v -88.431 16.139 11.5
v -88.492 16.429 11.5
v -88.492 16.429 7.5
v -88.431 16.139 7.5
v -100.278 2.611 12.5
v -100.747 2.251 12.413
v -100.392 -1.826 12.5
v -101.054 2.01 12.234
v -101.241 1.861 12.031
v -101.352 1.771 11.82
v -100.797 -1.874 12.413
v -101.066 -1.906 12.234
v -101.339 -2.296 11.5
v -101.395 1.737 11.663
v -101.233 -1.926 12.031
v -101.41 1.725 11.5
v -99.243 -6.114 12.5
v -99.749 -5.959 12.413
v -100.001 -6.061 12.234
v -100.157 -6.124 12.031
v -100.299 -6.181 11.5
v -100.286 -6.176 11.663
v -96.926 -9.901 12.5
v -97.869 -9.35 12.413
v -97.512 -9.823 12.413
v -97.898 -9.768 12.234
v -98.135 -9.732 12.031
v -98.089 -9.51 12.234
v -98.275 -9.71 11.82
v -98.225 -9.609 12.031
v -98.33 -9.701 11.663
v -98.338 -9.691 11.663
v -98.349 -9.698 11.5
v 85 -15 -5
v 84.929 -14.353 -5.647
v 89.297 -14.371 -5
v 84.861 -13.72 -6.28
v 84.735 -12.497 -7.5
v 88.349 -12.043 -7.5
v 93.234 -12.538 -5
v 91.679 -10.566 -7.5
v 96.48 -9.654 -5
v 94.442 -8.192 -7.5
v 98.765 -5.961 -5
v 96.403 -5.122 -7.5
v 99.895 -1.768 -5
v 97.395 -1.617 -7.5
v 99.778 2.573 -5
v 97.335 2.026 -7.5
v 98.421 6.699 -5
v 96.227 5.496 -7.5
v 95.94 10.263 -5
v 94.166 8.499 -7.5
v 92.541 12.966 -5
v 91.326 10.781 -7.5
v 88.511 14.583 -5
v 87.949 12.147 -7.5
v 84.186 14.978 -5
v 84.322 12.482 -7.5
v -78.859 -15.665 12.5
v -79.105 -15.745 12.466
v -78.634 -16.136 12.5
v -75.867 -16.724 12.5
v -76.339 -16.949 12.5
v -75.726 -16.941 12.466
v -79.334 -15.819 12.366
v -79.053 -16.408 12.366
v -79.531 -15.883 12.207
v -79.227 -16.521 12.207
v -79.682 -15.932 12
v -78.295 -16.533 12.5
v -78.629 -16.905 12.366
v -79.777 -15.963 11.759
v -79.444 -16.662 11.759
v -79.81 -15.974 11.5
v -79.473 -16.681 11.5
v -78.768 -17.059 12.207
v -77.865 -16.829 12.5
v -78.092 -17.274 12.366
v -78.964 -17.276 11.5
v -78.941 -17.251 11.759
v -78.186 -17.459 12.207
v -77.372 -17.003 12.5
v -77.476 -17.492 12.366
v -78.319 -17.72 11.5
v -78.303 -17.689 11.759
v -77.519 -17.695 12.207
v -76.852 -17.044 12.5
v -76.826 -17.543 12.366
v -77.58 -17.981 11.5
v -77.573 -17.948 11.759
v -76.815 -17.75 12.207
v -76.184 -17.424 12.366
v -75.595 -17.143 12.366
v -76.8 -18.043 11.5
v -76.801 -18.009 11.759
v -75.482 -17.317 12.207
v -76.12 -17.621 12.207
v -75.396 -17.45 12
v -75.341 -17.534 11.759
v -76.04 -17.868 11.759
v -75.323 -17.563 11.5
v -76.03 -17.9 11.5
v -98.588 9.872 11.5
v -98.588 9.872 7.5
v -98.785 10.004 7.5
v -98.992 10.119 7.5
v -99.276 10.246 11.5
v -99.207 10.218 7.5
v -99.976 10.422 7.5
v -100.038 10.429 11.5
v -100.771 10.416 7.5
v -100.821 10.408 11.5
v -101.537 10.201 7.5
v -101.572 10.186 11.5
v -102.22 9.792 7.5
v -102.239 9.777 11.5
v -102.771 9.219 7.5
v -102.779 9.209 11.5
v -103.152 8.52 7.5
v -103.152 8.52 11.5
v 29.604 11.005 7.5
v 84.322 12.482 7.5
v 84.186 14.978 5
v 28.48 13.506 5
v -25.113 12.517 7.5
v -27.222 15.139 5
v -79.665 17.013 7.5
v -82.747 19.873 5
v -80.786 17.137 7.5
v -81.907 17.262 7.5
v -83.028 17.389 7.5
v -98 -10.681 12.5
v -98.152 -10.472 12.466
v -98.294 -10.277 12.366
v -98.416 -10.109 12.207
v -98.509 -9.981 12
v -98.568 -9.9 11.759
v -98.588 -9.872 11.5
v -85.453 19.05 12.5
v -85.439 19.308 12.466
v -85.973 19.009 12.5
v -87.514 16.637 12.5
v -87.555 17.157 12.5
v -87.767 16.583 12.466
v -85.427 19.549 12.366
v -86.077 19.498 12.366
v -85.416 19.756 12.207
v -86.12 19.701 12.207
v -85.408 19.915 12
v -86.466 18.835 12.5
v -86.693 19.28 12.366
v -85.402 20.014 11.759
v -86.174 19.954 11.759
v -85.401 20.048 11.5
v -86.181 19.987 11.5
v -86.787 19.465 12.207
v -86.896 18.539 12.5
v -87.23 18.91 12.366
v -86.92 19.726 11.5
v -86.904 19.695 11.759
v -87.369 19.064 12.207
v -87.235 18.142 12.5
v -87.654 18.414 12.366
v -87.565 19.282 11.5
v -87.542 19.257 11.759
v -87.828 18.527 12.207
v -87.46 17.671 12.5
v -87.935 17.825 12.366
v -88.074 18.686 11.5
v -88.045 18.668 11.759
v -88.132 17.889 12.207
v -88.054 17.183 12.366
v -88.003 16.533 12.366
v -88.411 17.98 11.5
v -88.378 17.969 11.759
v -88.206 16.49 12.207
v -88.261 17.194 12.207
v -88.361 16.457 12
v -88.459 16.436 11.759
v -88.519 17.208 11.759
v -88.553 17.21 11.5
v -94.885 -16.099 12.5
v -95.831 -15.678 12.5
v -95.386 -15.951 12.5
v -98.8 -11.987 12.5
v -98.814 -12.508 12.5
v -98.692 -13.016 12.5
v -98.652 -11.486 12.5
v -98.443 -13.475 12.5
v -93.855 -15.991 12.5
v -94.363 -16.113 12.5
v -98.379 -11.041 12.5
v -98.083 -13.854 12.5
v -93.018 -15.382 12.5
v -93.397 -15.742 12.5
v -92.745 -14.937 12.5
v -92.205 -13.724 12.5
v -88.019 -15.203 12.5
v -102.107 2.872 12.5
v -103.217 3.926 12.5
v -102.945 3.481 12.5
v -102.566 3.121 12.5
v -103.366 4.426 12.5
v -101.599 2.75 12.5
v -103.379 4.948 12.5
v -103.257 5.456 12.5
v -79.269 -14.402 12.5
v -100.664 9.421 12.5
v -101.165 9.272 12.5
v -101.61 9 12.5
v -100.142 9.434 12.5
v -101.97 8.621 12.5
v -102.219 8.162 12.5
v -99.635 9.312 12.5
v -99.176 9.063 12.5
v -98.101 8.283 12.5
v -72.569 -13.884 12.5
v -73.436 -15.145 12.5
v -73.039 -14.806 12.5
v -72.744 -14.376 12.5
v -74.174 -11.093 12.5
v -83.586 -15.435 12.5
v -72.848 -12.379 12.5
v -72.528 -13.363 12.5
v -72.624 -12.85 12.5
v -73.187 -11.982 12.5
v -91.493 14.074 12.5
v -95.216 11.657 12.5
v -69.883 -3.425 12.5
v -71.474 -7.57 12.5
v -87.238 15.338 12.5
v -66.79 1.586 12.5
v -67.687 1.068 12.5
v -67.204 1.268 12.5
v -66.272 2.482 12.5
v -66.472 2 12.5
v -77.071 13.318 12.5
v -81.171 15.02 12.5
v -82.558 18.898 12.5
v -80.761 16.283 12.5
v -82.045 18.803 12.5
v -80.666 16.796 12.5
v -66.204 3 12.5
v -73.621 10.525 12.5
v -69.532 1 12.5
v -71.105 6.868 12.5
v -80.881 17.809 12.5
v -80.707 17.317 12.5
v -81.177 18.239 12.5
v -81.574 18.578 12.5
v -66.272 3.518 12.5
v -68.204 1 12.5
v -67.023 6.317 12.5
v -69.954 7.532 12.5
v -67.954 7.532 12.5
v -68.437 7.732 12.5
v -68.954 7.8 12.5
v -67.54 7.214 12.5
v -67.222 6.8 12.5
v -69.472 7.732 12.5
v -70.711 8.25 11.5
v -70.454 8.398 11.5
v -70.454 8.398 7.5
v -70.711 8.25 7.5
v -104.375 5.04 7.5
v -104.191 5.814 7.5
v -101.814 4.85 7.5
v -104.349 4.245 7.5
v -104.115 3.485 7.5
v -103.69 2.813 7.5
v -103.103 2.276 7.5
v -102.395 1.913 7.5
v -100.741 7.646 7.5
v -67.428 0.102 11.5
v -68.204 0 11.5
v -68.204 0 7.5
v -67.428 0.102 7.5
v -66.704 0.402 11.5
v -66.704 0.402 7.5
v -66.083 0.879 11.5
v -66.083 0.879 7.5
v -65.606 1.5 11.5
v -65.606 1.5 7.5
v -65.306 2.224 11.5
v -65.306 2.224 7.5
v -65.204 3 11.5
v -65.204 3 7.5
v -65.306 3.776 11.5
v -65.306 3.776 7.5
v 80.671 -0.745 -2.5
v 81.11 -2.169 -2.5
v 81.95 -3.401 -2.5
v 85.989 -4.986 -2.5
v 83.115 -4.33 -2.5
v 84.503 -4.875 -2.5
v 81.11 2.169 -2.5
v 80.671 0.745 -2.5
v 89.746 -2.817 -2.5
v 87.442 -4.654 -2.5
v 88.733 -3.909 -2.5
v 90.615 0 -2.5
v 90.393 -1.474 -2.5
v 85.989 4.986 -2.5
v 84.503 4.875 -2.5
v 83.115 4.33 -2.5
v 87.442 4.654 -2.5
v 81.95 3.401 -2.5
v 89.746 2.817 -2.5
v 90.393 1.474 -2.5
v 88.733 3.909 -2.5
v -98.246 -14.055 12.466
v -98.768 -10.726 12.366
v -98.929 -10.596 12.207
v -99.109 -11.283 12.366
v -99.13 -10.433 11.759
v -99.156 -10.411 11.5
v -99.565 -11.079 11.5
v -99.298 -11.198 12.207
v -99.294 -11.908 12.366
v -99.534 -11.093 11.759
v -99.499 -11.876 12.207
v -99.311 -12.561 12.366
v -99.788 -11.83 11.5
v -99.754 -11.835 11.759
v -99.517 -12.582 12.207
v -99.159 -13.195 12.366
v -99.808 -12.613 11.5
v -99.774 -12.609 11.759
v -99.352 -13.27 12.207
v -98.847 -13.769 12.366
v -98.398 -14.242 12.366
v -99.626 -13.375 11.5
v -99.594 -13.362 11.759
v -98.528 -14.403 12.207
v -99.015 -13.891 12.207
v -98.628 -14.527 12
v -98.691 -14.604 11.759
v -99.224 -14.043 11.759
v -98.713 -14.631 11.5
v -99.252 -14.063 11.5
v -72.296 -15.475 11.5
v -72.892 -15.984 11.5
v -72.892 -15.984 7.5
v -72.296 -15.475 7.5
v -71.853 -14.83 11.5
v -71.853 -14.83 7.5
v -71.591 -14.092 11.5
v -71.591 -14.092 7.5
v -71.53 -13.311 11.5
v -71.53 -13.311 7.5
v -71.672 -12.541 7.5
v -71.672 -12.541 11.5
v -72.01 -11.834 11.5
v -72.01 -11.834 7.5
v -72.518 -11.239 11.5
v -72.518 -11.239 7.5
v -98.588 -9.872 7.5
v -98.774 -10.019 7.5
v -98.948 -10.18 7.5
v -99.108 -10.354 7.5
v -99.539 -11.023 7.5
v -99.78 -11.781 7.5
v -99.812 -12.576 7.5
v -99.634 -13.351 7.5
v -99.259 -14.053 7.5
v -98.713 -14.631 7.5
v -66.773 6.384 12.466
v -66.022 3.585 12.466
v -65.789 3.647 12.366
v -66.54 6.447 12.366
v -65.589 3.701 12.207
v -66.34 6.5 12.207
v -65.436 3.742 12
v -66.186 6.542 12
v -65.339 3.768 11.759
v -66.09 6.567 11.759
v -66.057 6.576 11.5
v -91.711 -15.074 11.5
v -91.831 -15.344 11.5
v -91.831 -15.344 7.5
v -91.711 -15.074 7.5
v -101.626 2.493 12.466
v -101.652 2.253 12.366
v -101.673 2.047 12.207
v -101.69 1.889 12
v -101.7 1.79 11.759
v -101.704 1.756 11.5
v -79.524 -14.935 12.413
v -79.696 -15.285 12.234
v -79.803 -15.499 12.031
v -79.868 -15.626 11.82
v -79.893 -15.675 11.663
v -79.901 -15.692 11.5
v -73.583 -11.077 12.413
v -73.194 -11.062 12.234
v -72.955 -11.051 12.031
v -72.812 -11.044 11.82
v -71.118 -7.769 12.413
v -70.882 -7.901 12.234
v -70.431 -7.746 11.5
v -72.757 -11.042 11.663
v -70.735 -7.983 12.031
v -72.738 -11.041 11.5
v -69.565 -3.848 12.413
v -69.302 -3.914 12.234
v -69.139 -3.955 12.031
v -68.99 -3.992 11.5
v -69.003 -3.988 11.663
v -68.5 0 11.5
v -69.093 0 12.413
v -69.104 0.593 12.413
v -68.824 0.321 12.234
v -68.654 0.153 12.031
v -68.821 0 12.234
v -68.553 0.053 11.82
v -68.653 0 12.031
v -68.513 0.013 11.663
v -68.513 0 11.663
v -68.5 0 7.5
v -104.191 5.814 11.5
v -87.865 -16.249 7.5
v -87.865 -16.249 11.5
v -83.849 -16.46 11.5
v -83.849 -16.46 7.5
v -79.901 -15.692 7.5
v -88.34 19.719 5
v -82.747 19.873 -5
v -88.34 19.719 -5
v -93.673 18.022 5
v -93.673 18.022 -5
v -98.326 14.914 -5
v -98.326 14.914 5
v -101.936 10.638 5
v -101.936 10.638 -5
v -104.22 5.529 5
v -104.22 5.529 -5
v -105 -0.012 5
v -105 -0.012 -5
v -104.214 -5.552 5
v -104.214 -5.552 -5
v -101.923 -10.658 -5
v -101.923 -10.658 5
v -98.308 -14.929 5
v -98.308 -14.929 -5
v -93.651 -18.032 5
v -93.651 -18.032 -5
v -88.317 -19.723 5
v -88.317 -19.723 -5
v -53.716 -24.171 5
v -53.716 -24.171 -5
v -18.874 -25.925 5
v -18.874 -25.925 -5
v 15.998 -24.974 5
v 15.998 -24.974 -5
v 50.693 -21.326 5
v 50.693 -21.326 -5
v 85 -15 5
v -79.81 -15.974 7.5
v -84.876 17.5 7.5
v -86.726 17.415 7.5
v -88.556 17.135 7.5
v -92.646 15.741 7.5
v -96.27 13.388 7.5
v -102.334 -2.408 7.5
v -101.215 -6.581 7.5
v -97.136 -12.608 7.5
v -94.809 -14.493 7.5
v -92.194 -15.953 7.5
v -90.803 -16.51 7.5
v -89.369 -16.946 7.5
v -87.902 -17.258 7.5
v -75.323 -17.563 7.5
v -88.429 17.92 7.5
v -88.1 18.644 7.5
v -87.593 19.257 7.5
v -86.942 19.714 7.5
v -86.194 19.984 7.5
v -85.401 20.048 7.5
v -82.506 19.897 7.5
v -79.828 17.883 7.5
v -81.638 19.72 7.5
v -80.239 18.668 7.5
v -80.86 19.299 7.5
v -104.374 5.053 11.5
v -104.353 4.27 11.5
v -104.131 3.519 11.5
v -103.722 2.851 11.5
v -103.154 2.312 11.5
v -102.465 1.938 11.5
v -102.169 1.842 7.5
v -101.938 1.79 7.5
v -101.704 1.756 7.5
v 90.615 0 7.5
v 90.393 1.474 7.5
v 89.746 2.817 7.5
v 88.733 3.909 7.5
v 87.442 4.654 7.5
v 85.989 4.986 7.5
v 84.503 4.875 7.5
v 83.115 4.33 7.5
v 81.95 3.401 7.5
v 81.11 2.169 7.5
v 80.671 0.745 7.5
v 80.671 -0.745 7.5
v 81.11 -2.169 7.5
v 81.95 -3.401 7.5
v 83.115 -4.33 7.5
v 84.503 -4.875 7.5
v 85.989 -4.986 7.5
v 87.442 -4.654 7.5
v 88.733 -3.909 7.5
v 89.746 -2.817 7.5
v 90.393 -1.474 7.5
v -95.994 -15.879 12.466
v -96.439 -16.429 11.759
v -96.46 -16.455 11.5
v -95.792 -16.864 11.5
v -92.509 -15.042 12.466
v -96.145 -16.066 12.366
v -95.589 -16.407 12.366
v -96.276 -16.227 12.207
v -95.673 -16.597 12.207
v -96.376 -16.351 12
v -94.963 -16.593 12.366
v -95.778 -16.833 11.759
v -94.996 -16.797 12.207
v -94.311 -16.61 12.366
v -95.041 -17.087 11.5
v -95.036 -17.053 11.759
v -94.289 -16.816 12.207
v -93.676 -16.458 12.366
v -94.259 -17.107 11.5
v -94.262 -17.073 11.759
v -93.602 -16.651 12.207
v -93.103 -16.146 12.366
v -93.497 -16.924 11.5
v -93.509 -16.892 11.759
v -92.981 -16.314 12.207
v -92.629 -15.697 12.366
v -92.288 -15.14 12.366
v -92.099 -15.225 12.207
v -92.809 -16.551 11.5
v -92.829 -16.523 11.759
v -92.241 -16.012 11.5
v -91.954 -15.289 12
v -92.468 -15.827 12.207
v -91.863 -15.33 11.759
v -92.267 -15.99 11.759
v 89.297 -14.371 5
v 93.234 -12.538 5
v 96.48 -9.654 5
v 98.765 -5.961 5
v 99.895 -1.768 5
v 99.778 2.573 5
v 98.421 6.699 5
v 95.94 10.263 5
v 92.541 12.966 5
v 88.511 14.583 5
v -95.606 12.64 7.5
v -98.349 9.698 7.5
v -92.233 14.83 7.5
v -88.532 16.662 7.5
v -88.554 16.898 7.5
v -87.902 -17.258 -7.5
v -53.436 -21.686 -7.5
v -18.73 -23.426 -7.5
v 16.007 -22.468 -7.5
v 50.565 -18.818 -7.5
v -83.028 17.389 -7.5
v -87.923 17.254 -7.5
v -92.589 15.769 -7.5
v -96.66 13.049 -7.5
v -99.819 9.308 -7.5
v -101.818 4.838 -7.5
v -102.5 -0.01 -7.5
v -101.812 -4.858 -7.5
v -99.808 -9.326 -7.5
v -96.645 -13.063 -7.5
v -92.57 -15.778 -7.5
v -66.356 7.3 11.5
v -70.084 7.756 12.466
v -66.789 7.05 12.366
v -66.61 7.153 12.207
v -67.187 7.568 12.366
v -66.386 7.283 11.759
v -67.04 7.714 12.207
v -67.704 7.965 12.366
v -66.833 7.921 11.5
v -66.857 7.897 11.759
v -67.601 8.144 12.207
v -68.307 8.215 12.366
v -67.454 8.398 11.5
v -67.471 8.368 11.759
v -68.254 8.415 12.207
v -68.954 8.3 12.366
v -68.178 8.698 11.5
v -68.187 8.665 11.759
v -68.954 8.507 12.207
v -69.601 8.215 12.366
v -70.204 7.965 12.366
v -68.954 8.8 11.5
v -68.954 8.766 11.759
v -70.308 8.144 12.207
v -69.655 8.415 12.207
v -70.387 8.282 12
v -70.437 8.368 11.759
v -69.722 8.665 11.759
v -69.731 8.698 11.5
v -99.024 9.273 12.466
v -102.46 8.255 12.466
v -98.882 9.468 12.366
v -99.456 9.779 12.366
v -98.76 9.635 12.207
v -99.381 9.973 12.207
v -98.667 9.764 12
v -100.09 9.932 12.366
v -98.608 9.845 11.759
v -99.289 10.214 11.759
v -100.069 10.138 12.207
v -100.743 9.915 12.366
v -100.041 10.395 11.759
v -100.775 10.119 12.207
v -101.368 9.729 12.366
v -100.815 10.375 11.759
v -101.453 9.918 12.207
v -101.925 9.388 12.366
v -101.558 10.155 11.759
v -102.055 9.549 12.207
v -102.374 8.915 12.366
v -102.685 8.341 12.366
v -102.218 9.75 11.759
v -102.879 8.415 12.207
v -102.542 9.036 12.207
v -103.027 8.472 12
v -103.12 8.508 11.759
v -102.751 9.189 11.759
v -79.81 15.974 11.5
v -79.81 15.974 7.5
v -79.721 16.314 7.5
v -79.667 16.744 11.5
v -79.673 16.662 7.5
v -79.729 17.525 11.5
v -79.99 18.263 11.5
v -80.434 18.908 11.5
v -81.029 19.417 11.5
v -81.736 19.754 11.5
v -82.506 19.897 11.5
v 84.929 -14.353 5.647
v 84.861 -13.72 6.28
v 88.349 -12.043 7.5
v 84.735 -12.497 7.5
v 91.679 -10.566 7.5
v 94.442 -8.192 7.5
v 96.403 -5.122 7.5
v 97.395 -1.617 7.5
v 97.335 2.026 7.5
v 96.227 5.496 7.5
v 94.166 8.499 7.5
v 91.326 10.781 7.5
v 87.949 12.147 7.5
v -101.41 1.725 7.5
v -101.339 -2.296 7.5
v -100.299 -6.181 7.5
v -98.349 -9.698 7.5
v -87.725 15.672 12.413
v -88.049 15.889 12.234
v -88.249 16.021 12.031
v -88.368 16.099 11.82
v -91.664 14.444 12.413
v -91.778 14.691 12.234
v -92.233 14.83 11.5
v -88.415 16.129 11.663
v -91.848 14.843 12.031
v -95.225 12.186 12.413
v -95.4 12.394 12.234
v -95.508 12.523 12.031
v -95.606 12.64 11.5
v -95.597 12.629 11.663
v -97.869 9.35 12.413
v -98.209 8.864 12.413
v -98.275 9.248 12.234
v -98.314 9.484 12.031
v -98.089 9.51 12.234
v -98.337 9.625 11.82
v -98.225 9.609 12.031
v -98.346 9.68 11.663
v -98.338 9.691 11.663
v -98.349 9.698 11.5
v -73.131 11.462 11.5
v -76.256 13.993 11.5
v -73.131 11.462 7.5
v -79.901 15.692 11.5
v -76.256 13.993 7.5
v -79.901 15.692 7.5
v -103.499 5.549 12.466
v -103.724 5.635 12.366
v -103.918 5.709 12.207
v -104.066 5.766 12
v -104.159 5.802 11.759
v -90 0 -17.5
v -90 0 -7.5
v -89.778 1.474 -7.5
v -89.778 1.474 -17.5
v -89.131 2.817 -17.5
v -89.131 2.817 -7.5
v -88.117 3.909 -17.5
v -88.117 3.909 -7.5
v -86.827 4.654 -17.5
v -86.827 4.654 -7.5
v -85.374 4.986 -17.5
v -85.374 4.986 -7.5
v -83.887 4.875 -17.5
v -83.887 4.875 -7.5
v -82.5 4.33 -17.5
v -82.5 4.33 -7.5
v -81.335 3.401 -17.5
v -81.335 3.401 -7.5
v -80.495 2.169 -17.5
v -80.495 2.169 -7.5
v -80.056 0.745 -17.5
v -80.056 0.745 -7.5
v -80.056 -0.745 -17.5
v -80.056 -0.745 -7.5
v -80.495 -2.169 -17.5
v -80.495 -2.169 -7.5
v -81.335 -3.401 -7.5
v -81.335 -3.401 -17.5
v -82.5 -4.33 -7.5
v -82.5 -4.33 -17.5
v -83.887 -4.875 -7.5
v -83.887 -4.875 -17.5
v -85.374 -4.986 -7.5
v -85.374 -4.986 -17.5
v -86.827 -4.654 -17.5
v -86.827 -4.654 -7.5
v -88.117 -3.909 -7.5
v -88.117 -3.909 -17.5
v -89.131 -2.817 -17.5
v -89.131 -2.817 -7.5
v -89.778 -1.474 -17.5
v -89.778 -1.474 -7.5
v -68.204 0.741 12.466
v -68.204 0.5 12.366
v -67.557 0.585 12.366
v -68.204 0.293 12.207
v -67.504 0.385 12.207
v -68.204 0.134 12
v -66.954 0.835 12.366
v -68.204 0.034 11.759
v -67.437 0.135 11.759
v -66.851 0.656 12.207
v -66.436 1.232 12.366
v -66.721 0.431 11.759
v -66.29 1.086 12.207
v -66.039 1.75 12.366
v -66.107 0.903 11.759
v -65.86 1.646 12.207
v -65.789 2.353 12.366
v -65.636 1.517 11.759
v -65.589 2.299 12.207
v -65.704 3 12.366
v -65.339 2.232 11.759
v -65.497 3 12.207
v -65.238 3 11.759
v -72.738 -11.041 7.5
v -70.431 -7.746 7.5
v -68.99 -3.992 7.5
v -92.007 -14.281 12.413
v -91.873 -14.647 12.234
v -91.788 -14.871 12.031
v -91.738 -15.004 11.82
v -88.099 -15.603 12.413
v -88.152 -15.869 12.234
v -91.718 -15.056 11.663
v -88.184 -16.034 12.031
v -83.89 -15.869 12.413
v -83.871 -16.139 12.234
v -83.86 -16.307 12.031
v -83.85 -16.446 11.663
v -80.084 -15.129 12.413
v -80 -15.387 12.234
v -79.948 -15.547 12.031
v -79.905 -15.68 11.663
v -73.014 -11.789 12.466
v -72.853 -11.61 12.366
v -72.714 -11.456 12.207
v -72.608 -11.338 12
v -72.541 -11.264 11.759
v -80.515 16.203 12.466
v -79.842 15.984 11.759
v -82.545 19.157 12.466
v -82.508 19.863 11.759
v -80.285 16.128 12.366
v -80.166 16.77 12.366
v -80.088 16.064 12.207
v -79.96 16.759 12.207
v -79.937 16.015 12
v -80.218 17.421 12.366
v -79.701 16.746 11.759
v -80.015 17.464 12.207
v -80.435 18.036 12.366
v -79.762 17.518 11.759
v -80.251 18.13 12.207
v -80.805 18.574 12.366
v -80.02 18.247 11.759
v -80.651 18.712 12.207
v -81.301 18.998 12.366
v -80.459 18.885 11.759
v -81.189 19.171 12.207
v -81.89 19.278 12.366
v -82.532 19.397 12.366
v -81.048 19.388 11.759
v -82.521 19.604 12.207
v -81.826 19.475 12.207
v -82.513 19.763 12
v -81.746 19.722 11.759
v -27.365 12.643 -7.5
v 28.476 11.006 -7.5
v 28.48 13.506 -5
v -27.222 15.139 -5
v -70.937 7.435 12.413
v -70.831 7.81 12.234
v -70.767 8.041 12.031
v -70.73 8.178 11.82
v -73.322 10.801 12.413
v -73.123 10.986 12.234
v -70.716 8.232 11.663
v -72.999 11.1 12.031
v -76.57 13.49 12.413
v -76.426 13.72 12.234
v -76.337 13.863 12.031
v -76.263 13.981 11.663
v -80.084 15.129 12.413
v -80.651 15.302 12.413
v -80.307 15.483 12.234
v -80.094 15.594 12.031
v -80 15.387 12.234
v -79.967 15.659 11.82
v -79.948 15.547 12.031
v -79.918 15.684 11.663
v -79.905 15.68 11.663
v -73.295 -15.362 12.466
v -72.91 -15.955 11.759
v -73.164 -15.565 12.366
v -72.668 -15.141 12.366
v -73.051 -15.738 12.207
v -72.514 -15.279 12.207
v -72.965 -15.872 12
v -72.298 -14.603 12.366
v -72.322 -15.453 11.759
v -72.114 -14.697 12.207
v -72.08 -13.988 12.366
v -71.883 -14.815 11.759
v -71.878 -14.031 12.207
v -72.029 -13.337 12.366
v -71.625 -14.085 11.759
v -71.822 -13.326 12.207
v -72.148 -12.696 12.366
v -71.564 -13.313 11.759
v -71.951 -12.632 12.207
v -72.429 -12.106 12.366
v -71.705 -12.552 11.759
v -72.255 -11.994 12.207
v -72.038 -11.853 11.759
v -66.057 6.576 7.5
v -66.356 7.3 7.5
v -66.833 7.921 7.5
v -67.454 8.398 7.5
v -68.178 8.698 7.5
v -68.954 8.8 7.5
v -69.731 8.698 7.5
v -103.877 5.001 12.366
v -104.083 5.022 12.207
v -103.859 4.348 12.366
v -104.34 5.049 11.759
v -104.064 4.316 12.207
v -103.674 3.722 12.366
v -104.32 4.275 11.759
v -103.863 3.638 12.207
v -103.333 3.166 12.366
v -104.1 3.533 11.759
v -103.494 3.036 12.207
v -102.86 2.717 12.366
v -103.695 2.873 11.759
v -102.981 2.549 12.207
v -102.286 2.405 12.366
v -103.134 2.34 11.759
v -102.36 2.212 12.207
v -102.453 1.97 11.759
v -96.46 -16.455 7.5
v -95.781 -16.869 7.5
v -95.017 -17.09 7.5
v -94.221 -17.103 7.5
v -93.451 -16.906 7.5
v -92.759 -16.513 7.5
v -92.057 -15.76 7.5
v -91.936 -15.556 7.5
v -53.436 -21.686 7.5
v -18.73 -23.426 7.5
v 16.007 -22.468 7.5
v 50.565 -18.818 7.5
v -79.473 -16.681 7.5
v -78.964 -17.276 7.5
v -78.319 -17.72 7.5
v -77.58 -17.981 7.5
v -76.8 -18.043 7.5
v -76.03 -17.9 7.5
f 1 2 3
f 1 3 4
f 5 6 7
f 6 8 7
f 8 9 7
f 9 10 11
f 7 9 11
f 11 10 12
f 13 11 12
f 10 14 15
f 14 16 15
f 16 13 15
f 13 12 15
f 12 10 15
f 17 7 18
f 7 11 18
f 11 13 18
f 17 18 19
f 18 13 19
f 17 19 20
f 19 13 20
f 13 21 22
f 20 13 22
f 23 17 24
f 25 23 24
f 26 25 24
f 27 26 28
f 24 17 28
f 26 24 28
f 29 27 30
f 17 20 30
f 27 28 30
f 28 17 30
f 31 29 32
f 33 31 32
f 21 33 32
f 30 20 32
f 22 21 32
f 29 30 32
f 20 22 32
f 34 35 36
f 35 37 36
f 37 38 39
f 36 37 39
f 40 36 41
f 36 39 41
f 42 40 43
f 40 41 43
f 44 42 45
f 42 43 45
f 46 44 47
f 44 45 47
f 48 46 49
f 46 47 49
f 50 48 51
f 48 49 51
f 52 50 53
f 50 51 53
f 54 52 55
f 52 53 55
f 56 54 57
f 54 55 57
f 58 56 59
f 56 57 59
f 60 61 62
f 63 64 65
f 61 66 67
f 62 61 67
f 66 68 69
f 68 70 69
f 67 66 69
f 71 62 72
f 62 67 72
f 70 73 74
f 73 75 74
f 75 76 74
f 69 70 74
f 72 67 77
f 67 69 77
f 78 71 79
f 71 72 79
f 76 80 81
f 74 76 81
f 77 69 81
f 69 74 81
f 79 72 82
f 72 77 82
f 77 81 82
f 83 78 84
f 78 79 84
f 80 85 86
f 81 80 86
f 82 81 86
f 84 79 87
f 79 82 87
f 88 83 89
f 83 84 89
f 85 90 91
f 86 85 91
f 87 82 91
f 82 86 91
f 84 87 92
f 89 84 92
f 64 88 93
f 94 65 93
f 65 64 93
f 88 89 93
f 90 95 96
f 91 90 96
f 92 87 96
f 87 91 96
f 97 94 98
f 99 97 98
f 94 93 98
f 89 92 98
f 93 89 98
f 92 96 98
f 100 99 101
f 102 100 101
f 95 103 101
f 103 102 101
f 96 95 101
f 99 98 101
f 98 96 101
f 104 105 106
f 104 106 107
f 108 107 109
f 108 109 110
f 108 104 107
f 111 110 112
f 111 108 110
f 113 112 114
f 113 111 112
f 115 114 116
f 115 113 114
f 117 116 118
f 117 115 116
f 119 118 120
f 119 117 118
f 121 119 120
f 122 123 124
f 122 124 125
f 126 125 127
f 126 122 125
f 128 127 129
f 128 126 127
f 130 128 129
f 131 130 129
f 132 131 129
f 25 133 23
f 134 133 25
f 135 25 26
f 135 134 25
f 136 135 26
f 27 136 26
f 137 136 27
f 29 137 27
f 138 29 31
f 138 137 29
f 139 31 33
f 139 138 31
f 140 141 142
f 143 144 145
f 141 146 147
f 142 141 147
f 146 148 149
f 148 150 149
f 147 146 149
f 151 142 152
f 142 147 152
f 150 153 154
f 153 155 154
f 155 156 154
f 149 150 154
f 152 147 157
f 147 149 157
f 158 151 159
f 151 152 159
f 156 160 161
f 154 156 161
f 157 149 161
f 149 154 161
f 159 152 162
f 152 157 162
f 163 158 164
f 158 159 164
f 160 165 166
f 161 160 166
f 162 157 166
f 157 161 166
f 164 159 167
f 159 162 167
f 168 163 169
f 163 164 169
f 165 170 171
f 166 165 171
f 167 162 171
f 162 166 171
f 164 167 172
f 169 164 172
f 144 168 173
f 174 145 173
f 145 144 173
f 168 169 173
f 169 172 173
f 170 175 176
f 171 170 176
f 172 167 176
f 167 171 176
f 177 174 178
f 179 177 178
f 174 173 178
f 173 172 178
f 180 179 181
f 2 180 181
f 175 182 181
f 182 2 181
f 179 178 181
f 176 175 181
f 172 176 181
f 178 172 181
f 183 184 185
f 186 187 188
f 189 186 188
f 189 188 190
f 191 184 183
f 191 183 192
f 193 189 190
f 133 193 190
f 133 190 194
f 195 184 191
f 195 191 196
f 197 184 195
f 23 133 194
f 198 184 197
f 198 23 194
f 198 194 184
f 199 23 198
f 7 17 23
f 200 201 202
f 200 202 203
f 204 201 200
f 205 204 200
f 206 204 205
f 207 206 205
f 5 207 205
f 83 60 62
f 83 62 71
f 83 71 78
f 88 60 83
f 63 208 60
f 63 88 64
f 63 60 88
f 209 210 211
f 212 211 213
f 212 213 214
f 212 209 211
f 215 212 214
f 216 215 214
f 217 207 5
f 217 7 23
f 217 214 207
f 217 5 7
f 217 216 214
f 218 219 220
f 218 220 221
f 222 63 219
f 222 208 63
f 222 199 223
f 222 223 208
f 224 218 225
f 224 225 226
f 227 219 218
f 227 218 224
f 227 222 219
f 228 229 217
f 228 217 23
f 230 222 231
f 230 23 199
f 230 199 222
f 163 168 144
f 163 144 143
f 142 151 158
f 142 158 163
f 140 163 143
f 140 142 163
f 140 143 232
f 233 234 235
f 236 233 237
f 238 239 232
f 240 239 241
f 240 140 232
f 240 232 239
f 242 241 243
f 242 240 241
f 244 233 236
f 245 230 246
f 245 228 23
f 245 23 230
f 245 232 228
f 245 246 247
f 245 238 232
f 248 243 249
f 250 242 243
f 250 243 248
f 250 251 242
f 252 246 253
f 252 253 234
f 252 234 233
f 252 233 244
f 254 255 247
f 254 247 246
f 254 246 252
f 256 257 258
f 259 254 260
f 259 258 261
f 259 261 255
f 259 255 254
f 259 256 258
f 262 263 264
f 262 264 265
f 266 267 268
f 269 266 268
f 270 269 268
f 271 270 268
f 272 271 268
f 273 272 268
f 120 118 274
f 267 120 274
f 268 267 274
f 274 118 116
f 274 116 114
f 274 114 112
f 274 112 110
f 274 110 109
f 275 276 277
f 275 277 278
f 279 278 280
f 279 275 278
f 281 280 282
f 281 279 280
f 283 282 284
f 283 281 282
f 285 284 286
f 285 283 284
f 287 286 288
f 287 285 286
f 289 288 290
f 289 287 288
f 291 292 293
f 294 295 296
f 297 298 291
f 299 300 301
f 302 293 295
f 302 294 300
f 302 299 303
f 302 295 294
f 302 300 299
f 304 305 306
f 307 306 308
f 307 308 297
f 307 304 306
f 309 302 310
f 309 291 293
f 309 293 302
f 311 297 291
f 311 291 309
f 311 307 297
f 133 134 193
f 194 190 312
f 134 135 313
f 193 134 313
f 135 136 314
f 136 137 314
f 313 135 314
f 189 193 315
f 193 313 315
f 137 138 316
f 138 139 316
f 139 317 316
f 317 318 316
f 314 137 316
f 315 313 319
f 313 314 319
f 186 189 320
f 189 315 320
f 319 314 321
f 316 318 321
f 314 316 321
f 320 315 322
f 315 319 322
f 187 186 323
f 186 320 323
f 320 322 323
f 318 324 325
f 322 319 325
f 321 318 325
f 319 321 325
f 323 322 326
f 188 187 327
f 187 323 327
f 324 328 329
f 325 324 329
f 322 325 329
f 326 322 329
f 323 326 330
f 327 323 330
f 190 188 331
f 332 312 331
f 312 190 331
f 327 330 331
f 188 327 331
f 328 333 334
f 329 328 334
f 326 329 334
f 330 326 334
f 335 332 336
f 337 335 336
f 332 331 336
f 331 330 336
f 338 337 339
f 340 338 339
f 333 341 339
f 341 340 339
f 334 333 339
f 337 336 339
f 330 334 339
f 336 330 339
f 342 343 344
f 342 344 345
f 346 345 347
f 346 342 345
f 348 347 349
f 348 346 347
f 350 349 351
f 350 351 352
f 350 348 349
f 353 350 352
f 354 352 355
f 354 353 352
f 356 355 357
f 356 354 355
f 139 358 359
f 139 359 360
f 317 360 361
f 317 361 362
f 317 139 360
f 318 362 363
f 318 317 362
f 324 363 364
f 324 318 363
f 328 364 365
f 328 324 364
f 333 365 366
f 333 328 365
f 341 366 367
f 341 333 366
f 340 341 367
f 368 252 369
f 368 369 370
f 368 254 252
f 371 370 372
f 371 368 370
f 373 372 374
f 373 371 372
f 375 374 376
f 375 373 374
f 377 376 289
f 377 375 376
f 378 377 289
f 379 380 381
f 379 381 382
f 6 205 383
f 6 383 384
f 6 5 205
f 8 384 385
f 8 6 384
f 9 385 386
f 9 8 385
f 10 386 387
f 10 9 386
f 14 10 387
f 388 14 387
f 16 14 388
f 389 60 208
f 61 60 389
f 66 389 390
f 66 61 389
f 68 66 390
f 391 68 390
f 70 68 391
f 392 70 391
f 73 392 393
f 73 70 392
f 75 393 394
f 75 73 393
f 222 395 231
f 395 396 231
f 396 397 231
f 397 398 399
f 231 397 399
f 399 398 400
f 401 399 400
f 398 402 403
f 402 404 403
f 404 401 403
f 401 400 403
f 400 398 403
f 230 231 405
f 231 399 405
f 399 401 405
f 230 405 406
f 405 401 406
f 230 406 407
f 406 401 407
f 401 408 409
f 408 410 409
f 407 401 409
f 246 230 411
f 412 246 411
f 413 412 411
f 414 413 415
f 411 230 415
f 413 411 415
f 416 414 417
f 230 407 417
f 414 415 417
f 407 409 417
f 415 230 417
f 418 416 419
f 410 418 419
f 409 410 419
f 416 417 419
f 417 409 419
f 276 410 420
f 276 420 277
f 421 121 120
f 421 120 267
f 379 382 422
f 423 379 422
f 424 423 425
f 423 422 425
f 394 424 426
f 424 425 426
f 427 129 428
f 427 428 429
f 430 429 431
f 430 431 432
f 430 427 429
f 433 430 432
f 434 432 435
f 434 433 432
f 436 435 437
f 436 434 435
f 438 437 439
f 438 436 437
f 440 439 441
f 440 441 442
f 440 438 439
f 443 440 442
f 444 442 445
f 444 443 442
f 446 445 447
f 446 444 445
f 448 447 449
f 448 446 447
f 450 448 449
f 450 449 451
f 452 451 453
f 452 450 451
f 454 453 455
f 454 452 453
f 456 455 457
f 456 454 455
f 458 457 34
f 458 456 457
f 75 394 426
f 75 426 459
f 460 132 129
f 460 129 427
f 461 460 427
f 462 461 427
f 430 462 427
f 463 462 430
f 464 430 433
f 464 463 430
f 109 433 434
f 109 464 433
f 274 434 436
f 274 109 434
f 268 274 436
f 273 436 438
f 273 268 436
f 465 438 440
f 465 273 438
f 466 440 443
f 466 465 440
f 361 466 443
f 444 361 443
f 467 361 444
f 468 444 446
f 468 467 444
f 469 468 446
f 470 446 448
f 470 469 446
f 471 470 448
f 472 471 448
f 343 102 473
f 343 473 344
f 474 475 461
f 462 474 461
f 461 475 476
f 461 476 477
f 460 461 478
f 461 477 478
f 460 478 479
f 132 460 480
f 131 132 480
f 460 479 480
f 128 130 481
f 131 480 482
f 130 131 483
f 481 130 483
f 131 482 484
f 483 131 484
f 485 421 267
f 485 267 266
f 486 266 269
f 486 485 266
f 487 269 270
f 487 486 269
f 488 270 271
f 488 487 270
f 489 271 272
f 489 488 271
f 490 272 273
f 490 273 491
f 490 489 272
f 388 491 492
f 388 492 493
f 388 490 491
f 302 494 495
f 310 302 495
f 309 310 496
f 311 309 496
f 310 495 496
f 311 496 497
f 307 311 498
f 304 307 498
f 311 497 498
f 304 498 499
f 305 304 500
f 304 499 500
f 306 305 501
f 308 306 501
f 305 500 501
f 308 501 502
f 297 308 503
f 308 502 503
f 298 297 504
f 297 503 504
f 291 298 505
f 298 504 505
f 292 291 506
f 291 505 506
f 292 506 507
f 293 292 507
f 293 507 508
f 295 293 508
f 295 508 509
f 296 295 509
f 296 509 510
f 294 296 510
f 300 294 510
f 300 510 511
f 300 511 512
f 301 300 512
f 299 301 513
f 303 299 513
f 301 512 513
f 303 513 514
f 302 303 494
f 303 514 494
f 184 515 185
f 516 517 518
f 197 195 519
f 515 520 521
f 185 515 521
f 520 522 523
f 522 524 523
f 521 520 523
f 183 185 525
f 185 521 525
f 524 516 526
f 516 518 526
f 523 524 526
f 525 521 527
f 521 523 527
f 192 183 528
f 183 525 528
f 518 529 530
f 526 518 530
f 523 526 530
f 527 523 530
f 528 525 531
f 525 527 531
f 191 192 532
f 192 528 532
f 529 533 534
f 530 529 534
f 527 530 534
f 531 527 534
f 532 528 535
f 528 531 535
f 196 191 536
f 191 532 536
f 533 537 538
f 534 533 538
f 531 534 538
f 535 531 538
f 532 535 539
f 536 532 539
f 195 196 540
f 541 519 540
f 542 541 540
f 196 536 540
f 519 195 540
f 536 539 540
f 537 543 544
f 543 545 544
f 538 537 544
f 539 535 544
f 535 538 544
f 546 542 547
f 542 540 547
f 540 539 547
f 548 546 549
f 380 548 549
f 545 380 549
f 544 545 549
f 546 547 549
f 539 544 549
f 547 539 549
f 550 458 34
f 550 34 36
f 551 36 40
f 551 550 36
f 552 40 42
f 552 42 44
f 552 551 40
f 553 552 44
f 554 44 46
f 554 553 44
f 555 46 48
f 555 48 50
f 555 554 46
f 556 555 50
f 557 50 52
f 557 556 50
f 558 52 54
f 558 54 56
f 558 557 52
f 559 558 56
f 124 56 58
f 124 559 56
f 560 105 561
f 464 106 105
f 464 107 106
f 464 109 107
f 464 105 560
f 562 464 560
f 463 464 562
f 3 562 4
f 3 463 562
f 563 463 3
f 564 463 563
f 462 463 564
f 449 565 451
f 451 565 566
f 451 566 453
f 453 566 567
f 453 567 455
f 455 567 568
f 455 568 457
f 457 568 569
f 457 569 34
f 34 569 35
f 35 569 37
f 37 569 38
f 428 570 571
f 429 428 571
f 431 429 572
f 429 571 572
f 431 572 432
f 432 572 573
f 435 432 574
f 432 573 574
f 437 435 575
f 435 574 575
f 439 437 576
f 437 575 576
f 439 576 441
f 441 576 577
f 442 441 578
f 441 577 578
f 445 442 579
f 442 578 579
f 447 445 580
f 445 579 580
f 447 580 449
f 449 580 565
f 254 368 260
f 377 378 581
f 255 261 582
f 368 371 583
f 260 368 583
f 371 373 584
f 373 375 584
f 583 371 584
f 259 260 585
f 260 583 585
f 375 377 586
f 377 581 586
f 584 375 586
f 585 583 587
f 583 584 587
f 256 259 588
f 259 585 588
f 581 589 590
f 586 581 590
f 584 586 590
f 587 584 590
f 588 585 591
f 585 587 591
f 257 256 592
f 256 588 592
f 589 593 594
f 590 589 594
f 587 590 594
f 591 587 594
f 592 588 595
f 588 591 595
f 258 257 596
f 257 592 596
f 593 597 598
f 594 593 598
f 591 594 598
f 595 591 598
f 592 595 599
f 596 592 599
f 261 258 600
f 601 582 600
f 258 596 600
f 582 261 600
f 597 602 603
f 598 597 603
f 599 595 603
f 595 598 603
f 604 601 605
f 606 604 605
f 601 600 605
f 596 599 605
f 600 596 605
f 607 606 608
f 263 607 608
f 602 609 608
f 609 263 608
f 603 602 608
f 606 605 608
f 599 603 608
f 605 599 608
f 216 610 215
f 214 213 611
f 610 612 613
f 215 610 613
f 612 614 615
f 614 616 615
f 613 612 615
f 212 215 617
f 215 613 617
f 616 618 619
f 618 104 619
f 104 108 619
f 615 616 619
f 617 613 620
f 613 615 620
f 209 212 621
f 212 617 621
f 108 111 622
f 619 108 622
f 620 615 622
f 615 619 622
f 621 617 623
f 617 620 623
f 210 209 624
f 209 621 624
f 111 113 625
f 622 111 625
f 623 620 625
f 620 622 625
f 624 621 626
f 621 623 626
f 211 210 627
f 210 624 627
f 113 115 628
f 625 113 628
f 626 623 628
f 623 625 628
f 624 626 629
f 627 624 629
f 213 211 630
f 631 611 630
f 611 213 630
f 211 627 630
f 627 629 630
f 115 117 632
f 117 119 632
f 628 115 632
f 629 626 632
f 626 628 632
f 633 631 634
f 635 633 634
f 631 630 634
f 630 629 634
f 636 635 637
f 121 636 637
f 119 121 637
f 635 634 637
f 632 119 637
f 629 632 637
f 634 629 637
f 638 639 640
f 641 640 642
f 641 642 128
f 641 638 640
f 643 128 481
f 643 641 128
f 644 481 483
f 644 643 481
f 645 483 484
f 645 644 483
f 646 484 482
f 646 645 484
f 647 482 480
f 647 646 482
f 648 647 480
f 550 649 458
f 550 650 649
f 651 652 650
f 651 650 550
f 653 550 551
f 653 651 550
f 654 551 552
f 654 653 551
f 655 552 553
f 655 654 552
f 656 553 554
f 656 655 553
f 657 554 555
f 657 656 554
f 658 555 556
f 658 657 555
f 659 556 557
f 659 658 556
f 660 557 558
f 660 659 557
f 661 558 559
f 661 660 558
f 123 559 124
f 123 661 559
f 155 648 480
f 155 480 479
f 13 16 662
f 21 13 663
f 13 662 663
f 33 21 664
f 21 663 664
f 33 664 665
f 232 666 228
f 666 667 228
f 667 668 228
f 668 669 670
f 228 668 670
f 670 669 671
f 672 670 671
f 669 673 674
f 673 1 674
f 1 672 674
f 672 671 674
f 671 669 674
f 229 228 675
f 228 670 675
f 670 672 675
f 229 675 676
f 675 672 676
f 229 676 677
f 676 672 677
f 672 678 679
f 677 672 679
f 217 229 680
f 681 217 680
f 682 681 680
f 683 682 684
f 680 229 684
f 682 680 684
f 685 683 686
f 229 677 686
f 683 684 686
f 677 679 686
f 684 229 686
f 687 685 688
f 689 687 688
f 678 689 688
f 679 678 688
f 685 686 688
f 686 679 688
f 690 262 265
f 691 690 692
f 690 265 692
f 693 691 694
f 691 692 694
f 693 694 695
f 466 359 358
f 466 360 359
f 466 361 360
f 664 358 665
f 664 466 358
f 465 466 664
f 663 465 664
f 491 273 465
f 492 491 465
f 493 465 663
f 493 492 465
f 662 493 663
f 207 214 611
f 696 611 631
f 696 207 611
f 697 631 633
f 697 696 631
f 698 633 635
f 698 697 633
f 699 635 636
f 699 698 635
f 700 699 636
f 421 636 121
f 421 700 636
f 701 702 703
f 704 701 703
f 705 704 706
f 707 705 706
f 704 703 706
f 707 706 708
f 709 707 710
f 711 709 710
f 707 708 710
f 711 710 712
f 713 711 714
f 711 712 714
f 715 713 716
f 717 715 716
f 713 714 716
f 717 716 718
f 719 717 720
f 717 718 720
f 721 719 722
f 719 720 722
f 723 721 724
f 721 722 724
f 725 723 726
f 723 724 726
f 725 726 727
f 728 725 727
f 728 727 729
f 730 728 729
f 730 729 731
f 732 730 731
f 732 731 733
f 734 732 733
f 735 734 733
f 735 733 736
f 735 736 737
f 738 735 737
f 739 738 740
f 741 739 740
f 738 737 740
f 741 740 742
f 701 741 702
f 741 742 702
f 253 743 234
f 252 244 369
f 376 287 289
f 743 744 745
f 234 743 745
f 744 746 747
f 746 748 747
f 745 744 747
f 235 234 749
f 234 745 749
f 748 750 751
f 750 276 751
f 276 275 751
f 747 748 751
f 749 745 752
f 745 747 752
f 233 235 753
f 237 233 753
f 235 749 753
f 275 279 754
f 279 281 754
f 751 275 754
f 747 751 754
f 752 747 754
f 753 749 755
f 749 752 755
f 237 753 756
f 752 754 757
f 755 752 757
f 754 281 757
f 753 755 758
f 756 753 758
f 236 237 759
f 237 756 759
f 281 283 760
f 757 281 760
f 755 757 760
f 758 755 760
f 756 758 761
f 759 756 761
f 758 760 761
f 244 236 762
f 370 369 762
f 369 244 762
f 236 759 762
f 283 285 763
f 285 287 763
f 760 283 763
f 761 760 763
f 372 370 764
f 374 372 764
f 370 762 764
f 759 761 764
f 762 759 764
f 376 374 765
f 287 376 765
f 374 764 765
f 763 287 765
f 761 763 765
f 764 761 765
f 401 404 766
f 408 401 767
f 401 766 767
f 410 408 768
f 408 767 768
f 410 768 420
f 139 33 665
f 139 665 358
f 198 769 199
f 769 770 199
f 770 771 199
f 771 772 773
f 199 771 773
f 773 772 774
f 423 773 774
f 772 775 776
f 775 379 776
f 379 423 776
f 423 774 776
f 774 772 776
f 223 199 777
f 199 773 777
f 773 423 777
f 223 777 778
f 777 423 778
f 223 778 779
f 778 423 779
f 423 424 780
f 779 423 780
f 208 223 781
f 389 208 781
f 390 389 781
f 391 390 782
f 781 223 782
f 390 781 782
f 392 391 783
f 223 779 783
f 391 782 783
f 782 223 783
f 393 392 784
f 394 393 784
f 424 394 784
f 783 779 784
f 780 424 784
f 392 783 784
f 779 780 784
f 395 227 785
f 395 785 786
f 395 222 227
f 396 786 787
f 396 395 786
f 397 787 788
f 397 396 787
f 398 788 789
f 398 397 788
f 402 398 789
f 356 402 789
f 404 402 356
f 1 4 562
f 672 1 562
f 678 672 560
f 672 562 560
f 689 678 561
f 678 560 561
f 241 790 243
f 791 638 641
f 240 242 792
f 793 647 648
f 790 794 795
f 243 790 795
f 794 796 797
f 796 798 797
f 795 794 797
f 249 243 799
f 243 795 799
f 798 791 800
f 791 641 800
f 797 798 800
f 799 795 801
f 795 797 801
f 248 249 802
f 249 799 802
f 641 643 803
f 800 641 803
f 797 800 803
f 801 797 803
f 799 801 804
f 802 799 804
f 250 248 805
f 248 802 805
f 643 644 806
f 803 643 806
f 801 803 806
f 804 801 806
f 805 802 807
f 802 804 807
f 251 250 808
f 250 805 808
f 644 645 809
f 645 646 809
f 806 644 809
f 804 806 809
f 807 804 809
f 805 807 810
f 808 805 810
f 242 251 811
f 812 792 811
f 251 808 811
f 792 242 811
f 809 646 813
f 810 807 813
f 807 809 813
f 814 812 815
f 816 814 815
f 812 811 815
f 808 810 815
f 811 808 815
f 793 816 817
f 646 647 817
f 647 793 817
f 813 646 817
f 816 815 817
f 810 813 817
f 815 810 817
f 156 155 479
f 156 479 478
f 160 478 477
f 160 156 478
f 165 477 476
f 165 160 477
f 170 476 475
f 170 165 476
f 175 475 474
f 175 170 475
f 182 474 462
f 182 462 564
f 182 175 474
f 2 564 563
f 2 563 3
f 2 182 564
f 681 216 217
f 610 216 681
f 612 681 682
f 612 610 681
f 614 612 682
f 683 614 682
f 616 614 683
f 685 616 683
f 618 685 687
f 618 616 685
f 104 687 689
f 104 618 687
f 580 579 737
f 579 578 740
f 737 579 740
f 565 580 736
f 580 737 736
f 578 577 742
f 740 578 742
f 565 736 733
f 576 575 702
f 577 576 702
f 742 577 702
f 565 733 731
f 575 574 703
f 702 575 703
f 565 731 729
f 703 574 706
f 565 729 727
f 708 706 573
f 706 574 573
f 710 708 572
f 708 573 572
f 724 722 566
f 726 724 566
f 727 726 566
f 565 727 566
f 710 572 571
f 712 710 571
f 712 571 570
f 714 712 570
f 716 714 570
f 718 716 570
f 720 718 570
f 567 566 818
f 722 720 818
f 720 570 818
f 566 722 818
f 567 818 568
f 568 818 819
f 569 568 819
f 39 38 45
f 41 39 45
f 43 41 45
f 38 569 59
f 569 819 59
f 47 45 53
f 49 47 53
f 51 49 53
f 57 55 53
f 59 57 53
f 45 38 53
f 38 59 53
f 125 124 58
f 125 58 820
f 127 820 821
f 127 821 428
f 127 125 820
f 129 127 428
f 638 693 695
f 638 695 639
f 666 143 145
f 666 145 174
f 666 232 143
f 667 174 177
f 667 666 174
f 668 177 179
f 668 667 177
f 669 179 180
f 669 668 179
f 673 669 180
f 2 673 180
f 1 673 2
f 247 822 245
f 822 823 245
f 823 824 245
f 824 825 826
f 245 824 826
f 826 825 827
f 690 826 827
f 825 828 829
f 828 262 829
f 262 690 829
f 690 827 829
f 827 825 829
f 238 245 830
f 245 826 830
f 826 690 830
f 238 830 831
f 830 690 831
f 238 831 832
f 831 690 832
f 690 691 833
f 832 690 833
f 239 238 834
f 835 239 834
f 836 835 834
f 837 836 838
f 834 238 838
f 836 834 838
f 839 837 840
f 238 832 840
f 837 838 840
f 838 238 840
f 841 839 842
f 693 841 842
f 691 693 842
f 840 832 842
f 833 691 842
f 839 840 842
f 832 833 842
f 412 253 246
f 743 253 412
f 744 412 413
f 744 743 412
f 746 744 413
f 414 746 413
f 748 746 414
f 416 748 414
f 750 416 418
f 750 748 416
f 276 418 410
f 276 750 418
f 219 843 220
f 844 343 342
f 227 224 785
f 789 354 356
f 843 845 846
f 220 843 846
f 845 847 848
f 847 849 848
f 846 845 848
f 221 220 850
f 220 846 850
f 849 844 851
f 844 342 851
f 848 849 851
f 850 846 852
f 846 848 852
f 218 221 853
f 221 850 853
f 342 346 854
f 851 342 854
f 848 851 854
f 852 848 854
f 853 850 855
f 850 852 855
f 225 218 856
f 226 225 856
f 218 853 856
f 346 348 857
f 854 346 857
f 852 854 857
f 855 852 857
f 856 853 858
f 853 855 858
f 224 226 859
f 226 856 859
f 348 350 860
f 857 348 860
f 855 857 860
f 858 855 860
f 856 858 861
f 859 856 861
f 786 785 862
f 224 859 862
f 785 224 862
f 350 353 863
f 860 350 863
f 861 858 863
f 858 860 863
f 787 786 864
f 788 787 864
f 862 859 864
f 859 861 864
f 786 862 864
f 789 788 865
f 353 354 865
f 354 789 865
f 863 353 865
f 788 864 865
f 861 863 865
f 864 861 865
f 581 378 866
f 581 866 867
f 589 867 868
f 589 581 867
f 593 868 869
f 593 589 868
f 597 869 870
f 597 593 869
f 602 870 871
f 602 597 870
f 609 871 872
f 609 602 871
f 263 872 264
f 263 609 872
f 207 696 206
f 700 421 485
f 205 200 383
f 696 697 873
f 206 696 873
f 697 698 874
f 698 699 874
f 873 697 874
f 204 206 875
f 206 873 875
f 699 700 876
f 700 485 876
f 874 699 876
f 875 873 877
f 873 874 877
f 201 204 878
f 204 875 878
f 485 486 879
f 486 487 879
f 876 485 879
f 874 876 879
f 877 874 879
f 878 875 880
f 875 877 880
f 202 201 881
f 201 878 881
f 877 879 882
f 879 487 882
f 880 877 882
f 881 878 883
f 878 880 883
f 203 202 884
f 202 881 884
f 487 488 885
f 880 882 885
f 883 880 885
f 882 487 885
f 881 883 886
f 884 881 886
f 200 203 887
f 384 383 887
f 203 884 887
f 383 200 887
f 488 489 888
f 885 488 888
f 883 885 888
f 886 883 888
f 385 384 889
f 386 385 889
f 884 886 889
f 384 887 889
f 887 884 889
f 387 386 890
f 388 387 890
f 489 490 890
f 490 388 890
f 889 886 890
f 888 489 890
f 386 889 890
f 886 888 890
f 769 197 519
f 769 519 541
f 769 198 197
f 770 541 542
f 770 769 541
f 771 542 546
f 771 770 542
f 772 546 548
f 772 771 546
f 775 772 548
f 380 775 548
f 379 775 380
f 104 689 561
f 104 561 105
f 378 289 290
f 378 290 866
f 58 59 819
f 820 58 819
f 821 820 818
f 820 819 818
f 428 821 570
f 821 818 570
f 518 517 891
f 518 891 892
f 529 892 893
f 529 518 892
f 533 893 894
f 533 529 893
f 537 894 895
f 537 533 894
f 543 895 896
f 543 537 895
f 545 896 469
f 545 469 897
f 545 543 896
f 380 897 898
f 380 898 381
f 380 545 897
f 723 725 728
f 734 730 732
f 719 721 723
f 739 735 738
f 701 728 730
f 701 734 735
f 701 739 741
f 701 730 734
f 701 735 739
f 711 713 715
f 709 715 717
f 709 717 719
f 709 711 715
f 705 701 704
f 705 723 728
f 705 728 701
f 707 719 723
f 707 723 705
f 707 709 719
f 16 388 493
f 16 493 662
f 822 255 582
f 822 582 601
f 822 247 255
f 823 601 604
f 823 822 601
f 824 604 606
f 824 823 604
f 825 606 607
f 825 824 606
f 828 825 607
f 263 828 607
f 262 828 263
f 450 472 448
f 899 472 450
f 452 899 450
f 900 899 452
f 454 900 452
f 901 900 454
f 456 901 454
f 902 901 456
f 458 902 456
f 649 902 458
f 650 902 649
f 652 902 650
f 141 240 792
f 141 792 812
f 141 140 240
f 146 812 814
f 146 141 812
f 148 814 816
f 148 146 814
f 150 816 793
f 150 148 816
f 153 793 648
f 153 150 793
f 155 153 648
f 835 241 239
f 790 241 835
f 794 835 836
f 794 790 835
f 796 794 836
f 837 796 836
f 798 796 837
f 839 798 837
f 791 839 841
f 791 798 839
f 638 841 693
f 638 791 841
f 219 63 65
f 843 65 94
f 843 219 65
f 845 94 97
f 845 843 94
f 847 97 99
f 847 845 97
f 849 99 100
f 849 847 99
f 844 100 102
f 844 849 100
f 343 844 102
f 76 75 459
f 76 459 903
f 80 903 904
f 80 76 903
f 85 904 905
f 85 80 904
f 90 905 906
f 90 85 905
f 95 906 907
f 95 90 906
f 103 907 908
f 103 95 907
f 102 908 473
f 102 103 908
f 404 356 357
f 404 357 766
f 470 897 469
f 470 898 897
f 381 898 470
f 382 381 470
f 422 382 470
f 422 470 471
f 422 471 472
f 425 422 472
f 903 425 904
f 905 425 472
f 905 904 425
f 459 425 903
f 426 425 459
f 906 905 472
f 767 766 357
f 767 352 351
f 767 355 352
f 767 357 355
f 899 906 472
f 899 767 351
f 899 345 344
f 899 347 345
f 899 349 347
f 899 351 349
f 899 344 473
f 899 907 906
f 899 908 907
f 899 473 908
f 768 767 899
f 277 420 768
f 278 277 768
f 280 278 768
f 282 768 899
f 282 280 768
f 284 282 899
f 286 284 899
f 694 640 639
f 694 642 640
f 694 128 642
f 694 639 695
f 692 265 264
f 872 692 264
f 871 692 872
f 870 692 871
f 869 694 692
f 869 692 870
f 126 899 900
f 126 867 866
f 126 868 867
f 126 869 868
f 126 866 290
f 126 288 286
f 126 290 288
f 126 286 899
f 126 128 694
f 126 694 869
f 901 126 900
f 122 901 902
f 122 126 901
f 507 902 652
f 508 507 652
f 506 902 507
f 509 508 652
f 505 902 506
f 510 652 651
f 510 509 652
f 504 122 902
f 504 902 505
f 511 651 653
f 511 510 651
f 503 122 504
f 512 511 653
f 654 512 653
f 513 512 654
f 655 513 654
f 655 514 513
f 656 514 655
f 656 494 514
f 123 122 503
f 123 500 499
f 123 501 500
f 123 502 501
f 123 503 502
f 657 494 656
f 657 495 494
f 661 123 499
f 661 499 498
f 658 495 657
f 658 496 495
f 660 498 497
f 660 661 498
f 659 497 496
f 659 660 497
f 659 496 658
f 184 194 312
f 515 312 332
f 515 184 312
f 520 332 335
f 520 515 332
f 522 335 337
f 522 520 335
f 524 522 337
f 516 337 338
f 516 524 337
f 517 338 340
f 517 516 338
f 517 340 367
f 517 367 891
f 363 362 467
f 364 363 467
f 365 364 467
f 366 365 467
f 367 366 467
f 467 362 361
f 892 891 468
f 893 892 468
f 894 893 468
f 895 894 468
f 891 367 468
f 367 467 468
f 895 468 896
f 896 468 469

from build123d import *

# Parameters (mm, degrees)
BOSS_EXTRUDE1_DEPTH = 7.5
CHAMFER1_SIZE       = 2.5
SKETCH2_R           = 16.5
BOSS_EXTRUDE2_DEPTH = 5
BOSS_EXTRUDE3_DEPTH = 5
FILLET1_R           = 1
SKETCH4_R           = 5
CUT_EXTRUDE1_DEPTH  = 10
SKETCH5_R           = 5
BOSS_EXTRUDE4_DEPTH = 10


with BuildPart() as part:
    # Sketch1 → Boss-Extrude1 (new body, symmetric)
    with BuildSketch(Plane.XY):
        with BuildLine():
            ThreePointArc((85, -15), (99.994474711, 0.407097217), (84.186105477, 14.977902914))
            ThreePointArc((84.186105477, 14.977902914), (0.617423728, 13.934366249), (-82.746539792, 19.872642429))
            ThreePointArc((-82.746539792, 19.872642429), (-104.804980291, 2.786172224), (-88.316875687, -19.723040731))
            ThreePointArc((-88.316875687, -19.723040731), (-1.428818786, -25.787629696), (85, -15))
        make_face()
    extrude(amount=BOSS_EXTRUDE1_DEPTH, both=True)

    # Chamfer1
    chamfer1_edges = [part.edges().sort_by_distance(p)[0] for p in [
        (99.994474711, 0.407097217, 7.5),
        (0.617423728, 13.934366249, 7.5),
        (-104.804980291, 2.786172224, 7.5),
        (-1.428818786, -25.787629696, 7.5),
        (-104.804980291, 2.786172224, -7.5),
        (0.617423728, 13.934366249, -7.5),
        (99.994474711, 0.407097217, -7.5),
        (-1.428818786, -25.787629696, -7.5),
    ]]
    chamfer(chamfer1_edges, length=CHAMFER1_SIZE)

    # Sketch2 → Boss-Extrude2 (add)
    with BuildSketch(Plane.XY.offset(7.5)):
        with Locations((-85, 0)):
            Circle(SKETCH2_R)
    extrude(amount=BOSS_EXTRUDE2_DEPTH)

    # Sketch3 → Boss-Extrude3 (add)
    with BuildSketch(Plane.XY.offset(12.5)):
        with BuildLine():
            Line((-70.454369396, 8.397923745), (-85, 0))
            Line((-85, 0), (-68.20415251, 0))
            ThreePointArc((-68.20415251, 0), (-65.824092489, 1.173715713), (-65.306375031, 3.776457135))
            Line((-65.306375031, 3.776457135), (-66.056591917, 6.576304669))
            ThreePointArc((-66.056591917, 6.576304669), (-67.806319099, 8.571486131), (-70.454369396, 8.397923745))
        make_face()
        with BuildLine():
            Line((-72.518252849, -11.238615615), (-85, 0))
            Line((-85, 0), (-79.809797691, -15.973800202))
            ThreePointArc((-79.809797691, -15.973800202), (-77.95804872, -17.874673692), (-75.322711037, -17.562760922))
            Line((-75.322711037, -17.562760922), (-72.891727563, -15.984061795))
            ThreePointArc((-72.891727563, -15.984061795), (-71.534892666, -13.703427379), (-72.518252849, -11.238615615))
        make_face()
        with BuildLine():
            Line((-91.831486626, -15.343770181), (-85, 0))
            Line((-85, 0), (-98.588126054, -9.872351454))
            ThreePointArc((-98.588126054, -9.872351454), (-99.823742272, -12.220871592), (-98.71273147, -14.630840322))
            Line((-98.71273147, -14.630840322), (-96.460084172, -16.454998137))
            ThreePointArc((-96.460084172, -16.454998137), (-93.871786907, -17.040670013), (-91.831486626, -15.343770181))
        make_face()
        with BuildLine():
            Line((-101.70383808, 1.755644127), (-85, 0))
            Line((-85, 0), (-98.588126054, 9.872351454))
            ThreePointArc((-98.588126054, 9.872351454), (-101.203527845, 10.321759676), (-103.15222309, 8.52040432))
            Line((-103.15222309, 8.52040432), (-104.190993969, 5.814313662))
            ThreePointArc((-104.190993969, 5.814313662), (-103.948173183, 3.171714119), (-101.70383808, 1.755644127))
        make_face()
        with BuildLine():
            Line((-88.49205305, 16.428817924), (-85, 0))
            Line((-85, 0), (-79.809797691, 15.973800202))
            ThreePointArc((-79.809797691, 15.973800202), (-80.190588674, 18.600069896), (-82.505959371, 19.896739789))
            Line((-82.505959371, 19.896739789), (-85.400602379, 20.048441601))
            ThreePointArc((-85.400602379, 20.048441601), (-87.838828145, 19.000897142), (-88.49205305, 16.428817924))
        make_face()
    extrude(amount=-BOSS_EXTRUDE3_DEPTH)

    # Fillet1
    fillet1_edges = [part.edges().sort_by_distance(p)[0] for p in [
        (-77.95804872, -17.874673692, 12.5),
        (-79.855508642, -15.83311636, 12.5),
        (-74.1072193, -16.773411359, 12.5),
        (-71.534892666, -13.703427379, 12.5),
        (-72.628181614, -11.13963531, 12.5),
        (-85.863543278, -16.477387323, 12.5),
        (-99.823742272, -12.220871592, 12.5),
        (-98.468453231, -9.785404059, 12.5),
        (-97.586407821, -15.542919229, 12.5),
        (-93.871786907, -17.040670013, 12.5),
        (-91.771320618, -15.208635116, 12.5),
        (-100.937776134, -4.270514244, 12.5),
        (-101.203527845, 10.321759676, 12.5),
        (-98.468453231, 9.785404059, 12.5),
        (-103.67160853, 7.167358991, 12.5),
        (-103.948173183, 3.171714119, 12.5),
        (-101.556724677, 1.740181886, 12.5),
        (-93.986544078, 13.838064371, 12.5),
        (-80.190588674, 18.600069896, 12.5),
        (-79.855508642, 15.83311636, 12.5),
        (-83.953280875, 19.972590695, 12.5),
        (-87.838828145, 19.000897142, 12.5),
        (-88.461297974, 16.284126668, 12.5),
        (-74.616213548, 12.822908364, 12.5),
        (-65.824092489, 1.173715713, 12.5),
        (-68.352076255, 0, 12.5),
        (-65.681483474, 5.176380902, 12.5),
        (-67.806319099, 8.571486131, 12.5),
        (-70.582475117, 8.323961872, 12.5),
        (-69.595922963, -5.913071167, 12.5),
    ]]
    fillet(fillet1_edges, radius=FILLET1_R)

    # Sketch4 → Cut-Extrude1 (cut)
    with BuildSketch(Plane.XY.offset(7.5)):
        with Locations((85.615305239, 0)):
            Circle(SKETCH4_R)
    extrude(amount=-CUT_EXTRUDE1_DEPTH, mode=Mode.SUBTRACT)

    # Sketch5 → Boss-Extrude4 (add)
    with BuildSketch(Plane(origin=(0, 0, -7.5), x_dir=(-1, 0, 0), z_dir=(0, 0, -1))):
        with Locations((85, 0)):
            Circle(SKETCH5_R)
    extrude(amount=BOSS_EXTRUDE4_DEPTH)


solid = part.part
